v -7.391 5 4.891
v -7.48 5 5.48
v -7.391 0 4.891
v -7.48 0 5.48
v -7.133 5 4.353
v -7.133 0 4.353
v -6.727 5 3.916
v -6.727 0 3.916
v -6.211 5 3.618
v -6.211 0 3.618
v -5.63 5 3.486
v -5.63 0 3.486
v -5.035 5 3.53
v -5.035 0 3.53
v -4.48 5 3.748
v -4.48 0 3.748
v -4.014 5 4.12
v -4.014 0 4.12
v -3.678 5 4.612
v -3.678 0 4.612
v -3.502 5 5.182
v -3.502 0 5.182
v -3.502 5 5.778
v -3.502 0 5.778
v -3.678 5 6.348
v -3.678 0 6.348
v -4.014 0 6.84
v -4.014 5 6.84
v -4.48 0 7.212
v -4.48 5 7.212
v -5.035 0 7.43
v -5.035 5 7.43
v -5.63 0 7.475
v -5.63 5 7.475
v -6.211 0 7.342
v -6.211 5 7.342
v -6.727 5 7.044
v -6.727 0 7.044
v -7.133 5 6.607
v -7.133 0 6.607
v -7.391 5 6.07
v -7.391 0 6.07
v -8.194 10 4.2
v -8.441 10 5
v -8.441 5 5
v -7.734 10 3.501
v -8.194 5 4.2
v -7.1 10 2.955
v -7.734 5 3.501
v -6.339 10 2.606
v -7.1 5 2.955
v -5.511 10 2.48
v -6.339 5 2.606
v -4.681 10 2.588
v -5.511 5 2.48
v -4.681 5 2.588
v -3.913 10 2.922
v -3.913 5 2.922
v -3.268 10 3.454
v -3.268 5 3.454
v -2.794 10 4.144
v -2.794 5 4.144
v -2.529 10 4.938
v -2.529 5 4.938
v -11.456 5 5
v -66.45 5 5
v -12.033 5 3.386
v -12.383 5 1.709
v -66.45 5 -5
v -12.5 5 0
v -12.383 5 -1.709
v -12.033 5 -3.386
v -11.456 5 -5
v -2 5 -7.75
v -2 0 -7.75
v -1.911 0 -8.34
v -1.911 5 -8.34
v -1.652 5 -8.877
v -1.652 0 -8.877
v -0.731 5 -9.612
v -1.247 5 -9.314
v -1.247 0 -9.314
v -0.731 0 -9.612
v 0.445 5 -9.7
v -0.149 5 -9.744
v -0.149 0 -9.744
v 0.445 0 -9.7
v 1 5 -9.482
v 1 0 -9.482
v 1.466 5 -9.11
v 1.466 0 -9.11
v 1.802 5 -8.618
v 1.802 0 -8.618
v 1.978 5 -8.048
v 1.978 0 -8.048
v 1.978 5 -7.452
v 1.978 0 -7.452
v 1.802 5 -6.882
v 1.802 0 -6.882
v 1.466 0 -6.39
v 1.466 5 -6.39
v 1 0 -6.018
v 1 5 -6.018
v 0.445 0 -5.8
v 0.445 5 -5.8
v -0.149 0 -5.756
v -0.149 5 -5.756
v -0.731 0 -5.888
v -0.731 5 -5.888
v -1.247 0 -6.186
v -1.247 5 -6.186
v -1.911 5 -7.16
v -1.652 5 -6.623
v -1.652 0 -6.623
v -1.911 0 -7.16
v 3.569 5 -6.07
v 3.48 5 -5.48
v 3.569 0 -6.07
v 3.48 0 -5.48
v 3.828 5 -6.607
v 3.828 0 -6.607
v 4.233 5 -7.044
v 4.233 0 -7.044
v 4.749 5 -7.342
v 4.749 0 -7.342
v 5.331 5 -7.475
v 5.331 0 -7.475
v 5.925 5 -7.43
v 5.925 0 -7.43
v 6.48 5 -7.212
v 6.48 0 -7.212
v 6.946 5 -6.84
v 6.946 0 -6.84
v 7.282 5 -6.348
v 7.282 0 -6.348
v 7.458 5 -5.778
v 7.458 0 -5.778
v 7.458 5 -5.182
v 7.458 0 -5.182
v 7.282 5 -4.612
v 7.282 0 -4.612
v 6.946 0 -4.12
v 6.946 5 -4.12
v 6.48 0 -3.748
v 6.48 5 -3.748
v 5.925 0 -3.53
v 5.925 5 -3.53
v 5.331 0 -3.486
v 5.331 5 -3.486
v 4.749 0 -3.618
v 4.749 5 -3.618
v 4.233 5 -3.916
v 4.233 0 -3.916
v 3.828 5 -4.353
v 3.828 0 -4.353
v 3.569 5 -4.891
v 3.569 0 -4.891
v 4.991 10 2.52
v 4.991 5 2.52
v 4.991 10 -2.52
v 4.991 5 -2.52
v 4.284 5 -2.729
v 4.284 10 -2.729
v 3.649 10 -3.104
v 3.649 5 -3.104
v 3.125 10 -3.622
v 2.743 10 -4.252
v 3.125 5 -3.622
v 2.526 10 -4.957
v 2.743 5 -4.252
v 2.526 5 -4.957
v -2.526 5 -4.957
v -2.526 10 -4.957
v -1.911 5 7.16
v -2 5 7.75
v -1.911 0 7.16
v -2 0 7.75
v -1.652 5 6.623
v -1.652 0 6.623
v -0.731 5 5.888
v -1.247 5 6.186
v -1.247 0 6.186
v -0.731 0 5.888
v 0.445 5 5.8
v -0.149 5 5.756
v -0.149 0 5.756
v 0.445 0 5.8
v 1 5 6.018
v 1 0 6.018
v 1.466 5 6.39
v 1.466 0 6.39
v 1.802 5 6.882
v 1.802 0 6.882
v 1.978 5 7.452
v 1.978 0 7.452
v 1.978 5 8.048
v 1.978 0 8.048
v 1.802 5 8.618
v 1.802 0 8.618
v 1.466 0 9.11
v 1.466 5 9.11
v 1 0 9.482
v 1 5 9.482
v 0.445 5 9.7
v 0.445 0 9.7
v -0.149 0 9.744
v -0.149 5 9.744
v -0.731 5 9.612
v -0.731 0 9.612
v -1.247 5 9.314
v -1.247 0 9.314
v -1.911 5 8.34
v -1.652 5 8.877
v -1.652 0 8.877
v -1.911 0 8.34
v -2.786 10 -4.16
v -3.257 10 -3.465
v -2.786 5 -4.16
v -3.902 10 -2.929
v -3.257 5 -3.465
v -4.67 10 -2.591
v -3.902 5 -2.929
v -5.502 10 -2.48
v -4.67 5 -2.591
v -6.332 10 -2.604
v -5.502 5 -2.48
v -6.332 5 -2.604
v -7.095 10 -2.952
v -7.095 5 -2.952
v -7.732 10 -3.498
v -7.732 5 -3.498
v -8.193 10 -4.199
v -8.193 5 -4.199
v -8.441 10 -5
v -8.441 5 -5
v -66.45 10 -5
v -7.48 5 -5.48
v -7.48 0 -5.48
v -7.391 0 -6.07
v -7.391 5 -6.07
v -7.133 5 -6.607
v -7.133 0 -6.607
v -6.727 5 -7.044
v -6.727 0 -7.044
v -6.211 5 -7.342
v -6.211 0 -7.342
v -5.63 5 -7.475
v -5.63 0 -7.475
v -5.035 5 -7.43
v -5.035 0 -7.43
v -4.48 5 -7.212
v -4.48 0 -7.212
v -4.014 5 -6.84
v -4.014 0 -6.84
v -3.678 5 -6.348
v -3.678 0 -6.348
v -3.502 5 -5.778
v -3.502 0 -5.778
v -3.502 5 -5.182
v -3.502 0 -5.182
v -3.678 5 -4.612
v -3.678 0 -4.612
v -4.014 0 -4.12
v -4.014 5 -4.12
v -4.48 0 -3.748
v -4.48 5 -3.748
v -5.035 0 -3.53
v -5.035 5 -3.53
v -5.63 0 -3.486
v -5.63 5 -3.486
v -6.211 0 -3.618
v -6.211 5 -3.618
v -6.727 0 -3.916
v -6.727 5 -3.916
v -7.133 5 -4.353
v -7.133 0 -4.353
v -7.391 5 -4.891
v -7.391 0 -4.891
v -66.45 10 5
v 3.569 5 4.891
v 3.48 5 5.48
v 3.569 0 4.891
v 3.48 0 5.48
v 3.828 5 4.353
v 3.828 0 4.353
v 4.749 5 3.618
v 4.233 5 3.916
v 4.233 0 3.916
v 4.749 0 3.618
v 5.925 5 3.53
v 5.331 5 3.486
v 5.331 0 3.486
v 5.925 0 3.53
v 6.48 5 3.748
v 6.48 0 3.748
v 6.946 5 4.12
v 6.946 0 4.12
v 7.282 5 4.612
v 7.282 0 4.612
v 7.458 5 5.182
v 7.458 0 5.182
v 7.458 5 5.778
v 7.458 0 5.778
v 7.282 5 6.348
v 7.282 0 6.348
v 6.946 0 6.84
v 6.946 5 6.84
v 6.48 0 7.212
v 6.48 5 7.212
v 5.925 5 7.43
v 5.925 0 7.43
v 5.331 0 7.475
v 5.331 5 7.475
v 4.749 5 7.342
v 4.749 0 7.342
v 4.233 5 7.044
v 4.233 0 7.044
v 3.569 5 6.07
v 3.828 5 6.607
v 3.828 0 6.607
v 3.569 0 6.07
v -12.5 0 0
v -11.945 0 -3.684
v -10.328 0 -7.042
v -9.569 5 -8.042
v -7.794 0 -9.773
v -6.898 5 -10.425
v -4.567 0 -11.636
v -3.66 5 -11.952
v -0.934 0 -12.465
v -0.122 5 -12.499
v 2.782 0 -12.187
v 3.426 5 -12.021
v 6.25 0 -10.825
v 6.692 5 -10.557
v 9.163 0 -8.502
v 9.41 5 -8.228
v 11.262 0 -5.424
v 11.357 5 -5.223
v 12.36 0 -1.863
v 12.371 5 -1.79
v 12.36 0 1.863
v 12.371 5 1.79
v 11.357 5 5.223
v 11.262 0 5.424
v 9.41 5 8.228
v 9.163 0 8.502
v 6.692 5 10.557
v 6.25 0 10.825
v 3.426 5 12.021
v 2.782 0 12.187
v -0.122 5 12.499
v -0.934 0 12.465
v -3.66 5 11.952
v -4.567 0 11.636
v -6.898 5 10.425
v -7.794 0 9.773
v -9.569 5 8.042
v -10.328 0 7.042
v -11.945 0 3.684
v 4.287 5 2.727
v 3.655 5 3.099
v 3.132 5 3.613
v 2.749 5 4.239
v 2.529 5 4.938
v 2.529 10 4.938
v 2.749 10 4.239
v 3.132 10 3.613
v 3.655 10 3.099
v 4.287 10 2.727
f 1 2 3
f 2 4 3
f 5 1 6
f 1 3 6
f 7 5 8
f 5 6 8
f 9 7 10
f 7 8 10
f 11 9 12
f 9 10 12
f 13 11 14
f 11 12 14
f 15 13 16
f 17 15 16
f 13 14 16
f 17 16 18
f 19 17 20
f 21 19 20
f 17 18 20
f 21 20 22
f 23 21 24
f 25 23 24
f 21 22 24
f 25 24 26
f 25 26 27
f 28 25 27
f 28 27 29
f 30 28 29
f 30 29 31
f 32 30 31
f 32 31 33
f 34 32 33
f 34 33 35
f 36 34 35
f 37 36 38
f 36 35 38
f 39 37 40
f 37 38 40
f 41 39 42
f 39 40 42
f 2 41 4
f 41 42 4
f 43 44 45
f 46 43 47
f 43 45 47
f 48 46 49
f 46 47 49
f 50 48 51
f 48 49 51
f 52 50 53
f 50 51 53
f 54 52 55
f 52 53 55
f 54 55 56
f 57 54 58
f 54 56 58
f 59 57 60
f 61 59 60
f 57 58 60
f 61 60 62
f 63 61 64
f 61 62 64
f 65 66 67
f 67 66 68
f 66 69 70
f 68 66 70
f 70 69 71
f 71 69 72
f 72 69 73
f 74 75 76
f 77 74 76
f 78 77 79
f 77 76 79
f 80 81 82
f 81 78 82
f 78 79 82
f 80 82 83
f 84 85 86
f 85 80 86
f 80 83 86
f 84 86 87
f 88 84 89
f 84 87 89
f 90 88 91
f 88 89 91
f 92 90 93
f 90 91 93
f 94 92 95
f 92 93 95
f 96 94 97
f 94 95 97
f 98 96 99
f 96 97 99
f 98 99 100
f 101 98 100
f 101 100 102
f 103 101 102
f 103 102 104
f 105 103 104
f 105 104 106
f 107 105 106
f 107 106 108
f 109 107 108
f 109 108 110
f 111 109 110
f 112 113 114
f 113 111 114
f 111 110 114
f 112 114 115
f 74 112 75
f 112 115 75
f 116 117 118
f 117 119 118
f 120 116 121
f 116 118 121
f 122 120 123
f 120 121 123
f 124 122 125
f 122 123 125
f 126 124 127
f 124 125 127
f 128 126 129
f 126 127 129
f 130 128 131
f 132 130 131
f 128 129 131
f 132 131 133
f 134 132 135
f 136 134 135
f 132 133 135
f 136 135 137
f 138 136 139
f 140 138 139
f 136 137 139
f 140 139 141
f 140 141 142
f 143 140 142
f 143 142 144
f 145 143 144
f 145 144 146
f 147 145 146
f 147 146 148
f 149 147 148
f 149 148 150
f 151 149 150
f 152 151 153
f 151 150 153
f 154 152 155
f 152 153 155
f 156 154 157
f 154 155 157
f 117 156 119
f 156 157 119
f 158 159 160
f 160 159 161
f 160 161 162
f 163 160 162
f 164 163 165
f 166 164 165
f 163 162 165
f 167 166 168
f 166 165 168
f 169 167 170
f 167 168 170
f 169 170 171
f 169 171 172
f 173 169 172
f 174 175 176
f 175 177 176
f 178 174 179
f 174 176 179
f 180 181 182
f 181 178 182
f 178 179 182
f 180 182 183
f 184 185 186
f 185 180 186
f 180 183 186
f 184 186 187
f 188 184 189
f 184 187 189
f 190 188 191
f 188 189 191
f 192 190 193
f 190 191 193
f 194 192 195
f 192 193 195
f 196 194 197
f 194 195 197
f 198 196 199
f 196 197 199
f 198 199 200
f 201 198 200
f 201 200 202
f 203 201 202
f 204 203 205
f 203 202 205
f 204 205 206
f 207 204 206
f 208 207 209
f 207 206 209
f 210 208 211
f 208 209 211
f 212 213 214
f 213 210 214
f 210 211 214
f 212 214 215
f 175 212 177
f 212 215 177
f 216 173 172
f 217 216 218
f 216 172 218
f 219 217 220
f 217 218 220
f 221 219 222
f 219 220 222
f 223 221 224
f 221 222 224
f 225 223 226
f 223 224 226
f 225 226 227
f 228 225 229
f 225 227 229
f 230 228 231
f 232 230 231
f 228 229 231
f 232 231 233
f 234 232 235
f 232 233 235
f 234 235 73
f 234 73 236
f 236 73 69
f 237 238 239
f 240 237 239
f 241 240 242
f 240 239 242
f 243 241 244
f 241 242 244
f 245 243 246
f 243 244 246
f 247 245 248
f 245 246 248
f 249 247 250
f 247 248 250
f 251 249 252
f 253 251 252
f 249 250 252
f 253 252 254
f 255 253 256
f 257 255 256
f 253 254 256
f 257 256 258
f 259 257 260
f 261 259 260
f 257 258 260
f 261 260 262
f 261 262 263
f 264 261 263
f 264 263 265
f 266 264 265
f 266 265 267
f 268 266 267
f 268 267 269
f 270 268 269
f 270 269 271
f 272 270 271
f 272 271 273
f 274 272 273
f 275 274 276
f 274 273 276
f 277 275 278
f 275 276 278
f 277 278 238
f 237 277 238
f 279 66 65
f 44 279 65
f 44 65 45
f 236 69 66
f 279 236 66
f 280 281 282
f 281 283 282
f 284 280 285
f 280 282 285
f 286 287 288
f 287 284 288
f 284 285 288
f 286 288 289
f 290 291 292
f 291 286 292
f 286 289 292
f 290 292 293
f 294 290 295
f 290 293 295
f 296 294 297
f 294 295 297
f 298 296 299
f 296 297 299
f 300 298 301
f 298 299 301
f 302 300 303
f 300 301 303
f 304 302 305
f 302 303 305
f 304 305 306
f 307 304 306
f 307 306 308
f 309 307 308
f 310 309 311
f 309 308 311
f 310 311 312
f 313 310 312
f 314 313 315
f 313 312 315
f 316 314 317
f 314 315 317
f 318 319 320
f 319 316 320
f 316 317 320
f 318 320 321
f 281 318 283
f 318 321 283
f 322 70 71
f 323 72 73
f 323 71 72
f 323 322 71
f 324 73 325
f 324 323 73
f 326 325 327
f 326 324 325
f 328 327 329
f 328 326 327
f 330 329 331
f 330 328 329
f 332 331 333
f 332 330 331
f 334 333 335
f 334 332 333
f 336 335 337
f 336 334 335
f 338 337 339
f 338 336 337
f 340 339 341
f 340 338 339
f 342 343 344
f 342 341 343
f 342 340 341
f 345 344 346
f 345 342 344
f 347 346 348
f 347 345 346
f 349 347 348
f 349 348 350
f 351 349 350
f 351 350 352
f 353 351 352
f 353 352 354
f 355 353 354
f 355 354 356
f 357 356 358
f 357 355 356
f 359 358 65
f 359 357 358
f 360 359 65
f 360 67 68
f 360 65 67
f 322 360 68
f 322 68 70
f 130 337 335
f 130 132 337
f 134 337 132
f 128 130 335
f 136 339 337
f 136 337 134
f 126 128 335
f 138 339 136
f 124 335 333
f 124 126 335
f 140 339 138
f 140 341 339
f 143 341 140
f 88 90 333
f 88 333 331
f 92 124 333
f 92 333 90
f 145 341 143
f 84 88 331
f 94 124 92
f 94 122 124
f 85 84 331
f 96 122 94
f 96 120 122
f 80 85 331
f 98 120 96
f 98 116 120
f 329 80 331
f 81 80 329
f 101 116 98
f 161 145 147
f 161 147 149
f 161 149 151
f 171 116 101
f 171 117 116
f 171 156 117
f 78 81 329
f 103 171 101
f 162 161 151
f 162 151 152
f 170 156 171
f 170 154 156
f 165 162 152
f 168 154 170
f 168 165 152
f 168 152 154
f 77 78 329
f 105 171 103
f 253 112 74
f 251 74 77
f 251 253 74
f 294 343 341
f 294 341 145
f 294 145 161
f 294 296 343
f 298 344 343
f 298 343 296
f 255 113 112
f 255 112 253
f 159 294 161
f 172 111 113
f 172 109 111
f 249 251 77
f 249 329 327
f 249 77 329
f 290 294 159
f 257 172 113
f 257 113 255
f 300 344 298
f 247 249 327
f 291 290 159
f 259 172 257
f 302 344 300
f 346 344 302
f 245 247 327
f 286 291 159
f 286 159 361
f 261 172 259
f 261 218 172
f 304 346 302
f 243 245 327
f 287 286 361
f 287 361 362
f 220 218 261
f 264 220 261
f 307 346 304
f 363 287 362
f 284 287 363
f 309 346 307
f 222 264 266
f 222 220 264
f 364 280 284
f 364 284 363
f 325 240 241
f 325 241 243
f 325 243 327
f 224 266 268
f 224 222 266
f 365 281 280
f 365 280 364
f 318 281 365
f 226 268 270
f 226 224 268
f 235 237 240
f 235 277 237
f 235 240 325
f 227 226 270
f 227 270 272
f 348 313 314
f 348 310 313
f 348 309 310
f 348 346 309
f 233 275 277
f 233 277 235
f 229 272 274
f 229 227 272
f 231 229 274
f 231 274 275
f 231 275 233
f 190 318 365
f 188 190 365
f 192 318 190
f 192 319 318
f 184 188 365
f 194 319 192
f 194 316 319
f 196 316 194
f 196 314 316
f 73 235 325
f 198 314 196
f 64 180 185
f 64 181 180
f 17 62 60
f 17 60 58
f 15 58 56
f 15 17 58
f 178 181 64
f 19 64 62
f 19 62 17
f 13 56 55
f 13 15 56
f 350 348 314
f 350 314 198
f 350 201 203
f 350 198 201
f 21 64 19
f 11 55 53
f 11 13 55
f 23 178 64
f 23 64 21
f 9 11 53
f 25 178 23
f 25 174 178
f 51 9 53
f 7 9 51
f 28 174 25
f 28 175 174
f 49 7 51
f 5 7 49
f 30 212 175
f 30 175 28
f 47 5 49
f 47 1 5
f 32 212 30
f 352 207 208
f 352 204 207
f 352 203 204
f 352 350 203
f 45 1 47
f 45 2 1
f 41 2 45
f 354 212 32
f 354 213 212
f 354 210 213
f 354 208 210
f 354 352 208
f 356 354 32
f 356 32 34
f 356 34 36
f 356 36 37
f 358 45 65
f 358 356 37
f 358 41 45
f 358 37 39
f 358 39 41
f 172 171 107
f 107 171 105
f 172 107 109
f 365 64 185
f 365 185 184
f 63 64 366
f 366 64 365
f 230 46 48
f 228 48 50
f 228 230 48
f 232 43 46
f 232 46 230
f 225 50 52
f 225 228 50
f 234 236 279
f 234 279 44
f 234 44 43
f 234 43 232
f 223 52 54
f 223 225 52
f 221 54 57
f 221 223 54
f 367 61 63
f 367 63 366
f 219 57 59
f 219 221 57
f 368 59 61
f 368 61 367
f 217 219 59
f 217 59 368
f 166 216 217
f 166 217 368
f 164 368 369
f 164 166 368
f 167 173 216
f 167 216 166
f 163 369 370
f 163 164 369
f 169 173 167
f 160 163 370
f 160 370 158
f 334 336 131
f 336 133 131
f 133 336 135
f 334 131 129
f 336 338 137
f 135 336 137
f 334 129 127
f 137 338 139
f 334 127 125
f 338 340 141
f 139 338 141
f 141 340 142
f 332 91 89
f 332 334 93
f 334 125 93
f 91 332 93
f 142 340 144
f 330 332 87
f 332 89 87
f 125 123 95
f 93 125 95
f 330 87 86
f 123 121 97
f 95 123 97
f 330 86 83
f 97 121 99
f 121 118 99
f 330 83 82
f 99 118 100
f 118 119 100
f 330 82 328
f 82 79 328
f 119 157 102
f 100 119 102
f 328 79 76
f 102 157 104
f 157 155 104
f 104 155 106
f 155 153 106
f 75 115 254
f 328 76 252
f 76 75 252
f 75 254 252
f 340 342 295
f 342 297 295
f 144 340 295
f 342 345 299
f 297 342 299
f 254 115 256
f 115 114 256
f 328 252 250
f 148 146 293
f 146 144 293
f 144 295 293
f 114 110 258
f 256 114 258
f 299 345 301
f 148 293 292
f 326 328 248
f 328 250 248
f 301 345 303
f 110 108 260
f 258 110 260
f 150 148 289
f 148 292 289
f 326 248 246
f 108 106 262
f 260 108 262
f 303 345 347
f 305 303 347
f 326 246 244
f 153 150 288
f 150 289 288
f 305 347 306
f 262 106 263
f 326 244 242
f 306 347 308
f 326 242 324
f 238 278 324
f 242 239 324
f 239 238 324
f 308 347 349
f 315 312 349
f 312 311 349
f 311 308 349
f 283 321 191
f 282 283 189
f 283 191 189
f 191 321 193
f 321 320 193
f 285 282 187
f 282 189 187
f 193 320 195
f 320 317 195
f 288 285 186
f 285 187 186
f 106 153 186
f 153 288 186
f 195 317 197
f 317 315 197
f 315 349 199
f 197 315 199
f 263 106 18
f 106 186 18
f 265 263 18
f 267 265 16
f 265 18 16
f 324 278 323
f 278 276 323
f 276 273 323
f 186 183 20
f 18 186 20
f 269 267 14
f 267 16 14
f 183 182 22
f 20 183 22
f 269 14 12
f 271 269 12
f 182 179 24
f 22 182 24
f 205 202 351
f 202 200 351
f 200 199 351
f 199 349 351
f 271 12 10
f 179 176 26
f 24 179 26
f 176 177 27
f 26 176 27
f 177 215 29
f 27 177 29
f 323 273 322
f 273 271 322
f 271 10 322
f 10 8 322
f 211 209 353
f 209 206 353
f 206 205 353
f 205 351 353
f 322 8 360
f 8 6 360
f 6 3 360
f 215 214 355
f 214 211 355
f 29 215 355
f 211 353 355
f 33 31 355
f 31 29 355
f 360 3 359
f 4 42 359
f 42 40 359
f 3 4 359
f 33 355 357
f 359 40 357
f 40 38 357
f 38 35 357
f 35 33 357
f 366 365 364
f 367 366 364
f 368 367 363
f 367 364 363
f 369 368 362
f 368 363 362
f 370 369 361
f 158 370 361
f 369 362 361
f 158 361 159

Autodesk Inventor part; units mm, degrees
ref_plane "YZ Plane" through (0, 0, 0) normal (1, 0, 0) x (0, 1, 0)
ref_plane "XZ Plane" through (0, 0, 0) normal (0, 1, 0) x (-1, 0, 0)
ref_plane "XY Plane" through (0, 0, 0) normal (0, 0, 1) x (1, 0, 0)
sketch "Sketch1" plane through (0, 0, 0) normal (0, 1, 0) x (-1, 0, 0)
  circle A0 centre (0, 0) radius 12.5
  line L0 (0, 0) -> (7.75, 0) construction
  circle A1 centre (5.4801, -5.4801) radius 2
  circle A2 centre (-5.4801, -5.4801) radius 2
  circle A3 centre (-5.4801, 5.4801) radius 2
  circle A4 centre (5.4801, 5.4801) radius 2
  circle A5 centre (0, -7.75) radius 2
  circle A6 centre (0, 7.75) radius 2
  dimension "d0" = 25
  dimension "d3" = 4
  dimension "d6" = 360
  dimension "d8" = 4
  dimension "d11" = 360
extrude "Extrusion1" add sketch "Sketch1" along normal blind 5
sketch "Sketch2" plane through (0, 5, 0) normal (0, 1, 0) x (1, 0, 0)
  line L0 (4.991, -3.5408) -> (4.991, 3.5408)
  line L1 (-66.4503, 5) -> (-66.4503, -5)
  line L2 (4.991, -4.9385) -> (14.991, -4.9385) construction
  line L3 (-82.7386, 0) -> (31.2793, 0) projected
  arc A0 (-3.5548, -4.9385) -> (-7.4216, -5) centre (-5.4801, -5.4801) ccw
  line L4 (-66.4503, -5) -> (-7.4216, -5)
  line L5 (-3.5548, -4.9385) -> (3.5548, -4.9385)
  circle A1 centre (-5.4801, 5.4801) radius 2 projected
  arc A2 (-7.4216, 5) -> (-3.5497, 4.9571) centre (-5.4801, 5.4801) ccw
  line L6 (3.5497, 4.9571) -> (-3.5497, 4.9571)
  line L7 (-7.4216, 5) -> (-66.4503, 5)
  arc A3 (4.991, -3.5408) -> (3.5548, -4.9385) centre (5.4801, -5.4801) ccw
  circle A4 centre (5.4801, 5.4801) radius 2 projected
  arc A5 (3.5497, 4.9571) -> (4.991, 3.5408) centre (5.4801, 5.4801) ccw
  dimension "d24" = 10
  dimension "d25" = 90
  dimension "d26" = 70
  dimension "d27" = 4
  dimension "d28" = 4
  dimension "d29" = 4
  dimension "d30" = 4
extrude "Extrusion2" add sketch "Sketch2" along normal blind 5 contours A3 L5 A0 L4 L1 L3 L0 | L3 L1 L7 A1 L6 A4 L0
sketch "Sketch4" plane through (0, 10, 0) normal (0, 1, 0) x (1, 0, 0)
  line L0 (-3.5548, -4.9385) -> (3.5548, -4.9385) projected
  line L1 (-3.5548, -4.9385) -> (3.5548, -4.9385)
  line L2 (3.5497, 4.9571) -> (-3.5497, 4.9571) projected
  line L3 (-3.5497, 4.9571) -> (3.5497, 4.9571)
  line L4 (-4.4956, -10.2074) -> (2.6201, -10.2074)
  point P0 (0, 0)
sketch "Sketch8" plane through (0, 5, 0) normal (0, 1, 0) x (1, 0, 0)
  circle A0 centre (-5.4801, 5.4801) radius 2 projected
  circle A1 centre (-5.4801, 5.4801) radius 3
  circle A2 centre (-5.4801, -5.4801) radius 2 projected
  circle A3 centre (-5.4801, -5.4801) radius 3
  circle A4 centre (5.4801, 5.4801) radius 2 projected
  circle A5 centre (5.4801, 5.4801) radius 3
  arc A6 (3.5548, -4.9385) -> (4.991, -3.5408) centre (5.4801, -5.4801) ccw projected
  circle A7 centre (5.4801, -5.4801) radius 3
  point P0 (0, 0)
  dimension "d50" = 6
  dimension "d51" = 6
  dimension "d52" = 6
  dimension "d53" = 6
extrude "Extrusion6" cut sketch "Sketch8" along normal blind 39.25 contours A0 | A1 | A2 | A3 | A4 | A5 | A7
sketch "Sketch33" plane through (0, 10, 0) normal (0, 1, 0) x (1, 0, 0)
  line L0 (-2.5294, -4.9385) -> (2.5294, -4.9385) projected
  arc A0 (-8.4414, 5) -> (-2.526, 4.9571) centre (-5.4801, 5.4801) ccw projected
  line L1 (-2.5294, -4.9385) -> (-2.526, 4.9571)
  line L2 (-2.526, 4.9571) -> (-2.526, 4.9571)
  line L3 (2.526, 4.9571) -> (-2.526, 4.9571) projected
  line L4 (-2.526, 4.9571) -> (-2.5215, 18.4671)
  line L5 (-2.5215, 18.4671) -> (-2.534, -18.5329)
  point P0 (0, 0)
  dimension "d105" = 13.51
  dimension "d106" = 37
sketch "Sketch34" plane through (-66.4503, 5, -5) normal (-1, 0, 0) x (0, 0, 1)
  point P0 (5, -5)
properties part number "US holder1"
